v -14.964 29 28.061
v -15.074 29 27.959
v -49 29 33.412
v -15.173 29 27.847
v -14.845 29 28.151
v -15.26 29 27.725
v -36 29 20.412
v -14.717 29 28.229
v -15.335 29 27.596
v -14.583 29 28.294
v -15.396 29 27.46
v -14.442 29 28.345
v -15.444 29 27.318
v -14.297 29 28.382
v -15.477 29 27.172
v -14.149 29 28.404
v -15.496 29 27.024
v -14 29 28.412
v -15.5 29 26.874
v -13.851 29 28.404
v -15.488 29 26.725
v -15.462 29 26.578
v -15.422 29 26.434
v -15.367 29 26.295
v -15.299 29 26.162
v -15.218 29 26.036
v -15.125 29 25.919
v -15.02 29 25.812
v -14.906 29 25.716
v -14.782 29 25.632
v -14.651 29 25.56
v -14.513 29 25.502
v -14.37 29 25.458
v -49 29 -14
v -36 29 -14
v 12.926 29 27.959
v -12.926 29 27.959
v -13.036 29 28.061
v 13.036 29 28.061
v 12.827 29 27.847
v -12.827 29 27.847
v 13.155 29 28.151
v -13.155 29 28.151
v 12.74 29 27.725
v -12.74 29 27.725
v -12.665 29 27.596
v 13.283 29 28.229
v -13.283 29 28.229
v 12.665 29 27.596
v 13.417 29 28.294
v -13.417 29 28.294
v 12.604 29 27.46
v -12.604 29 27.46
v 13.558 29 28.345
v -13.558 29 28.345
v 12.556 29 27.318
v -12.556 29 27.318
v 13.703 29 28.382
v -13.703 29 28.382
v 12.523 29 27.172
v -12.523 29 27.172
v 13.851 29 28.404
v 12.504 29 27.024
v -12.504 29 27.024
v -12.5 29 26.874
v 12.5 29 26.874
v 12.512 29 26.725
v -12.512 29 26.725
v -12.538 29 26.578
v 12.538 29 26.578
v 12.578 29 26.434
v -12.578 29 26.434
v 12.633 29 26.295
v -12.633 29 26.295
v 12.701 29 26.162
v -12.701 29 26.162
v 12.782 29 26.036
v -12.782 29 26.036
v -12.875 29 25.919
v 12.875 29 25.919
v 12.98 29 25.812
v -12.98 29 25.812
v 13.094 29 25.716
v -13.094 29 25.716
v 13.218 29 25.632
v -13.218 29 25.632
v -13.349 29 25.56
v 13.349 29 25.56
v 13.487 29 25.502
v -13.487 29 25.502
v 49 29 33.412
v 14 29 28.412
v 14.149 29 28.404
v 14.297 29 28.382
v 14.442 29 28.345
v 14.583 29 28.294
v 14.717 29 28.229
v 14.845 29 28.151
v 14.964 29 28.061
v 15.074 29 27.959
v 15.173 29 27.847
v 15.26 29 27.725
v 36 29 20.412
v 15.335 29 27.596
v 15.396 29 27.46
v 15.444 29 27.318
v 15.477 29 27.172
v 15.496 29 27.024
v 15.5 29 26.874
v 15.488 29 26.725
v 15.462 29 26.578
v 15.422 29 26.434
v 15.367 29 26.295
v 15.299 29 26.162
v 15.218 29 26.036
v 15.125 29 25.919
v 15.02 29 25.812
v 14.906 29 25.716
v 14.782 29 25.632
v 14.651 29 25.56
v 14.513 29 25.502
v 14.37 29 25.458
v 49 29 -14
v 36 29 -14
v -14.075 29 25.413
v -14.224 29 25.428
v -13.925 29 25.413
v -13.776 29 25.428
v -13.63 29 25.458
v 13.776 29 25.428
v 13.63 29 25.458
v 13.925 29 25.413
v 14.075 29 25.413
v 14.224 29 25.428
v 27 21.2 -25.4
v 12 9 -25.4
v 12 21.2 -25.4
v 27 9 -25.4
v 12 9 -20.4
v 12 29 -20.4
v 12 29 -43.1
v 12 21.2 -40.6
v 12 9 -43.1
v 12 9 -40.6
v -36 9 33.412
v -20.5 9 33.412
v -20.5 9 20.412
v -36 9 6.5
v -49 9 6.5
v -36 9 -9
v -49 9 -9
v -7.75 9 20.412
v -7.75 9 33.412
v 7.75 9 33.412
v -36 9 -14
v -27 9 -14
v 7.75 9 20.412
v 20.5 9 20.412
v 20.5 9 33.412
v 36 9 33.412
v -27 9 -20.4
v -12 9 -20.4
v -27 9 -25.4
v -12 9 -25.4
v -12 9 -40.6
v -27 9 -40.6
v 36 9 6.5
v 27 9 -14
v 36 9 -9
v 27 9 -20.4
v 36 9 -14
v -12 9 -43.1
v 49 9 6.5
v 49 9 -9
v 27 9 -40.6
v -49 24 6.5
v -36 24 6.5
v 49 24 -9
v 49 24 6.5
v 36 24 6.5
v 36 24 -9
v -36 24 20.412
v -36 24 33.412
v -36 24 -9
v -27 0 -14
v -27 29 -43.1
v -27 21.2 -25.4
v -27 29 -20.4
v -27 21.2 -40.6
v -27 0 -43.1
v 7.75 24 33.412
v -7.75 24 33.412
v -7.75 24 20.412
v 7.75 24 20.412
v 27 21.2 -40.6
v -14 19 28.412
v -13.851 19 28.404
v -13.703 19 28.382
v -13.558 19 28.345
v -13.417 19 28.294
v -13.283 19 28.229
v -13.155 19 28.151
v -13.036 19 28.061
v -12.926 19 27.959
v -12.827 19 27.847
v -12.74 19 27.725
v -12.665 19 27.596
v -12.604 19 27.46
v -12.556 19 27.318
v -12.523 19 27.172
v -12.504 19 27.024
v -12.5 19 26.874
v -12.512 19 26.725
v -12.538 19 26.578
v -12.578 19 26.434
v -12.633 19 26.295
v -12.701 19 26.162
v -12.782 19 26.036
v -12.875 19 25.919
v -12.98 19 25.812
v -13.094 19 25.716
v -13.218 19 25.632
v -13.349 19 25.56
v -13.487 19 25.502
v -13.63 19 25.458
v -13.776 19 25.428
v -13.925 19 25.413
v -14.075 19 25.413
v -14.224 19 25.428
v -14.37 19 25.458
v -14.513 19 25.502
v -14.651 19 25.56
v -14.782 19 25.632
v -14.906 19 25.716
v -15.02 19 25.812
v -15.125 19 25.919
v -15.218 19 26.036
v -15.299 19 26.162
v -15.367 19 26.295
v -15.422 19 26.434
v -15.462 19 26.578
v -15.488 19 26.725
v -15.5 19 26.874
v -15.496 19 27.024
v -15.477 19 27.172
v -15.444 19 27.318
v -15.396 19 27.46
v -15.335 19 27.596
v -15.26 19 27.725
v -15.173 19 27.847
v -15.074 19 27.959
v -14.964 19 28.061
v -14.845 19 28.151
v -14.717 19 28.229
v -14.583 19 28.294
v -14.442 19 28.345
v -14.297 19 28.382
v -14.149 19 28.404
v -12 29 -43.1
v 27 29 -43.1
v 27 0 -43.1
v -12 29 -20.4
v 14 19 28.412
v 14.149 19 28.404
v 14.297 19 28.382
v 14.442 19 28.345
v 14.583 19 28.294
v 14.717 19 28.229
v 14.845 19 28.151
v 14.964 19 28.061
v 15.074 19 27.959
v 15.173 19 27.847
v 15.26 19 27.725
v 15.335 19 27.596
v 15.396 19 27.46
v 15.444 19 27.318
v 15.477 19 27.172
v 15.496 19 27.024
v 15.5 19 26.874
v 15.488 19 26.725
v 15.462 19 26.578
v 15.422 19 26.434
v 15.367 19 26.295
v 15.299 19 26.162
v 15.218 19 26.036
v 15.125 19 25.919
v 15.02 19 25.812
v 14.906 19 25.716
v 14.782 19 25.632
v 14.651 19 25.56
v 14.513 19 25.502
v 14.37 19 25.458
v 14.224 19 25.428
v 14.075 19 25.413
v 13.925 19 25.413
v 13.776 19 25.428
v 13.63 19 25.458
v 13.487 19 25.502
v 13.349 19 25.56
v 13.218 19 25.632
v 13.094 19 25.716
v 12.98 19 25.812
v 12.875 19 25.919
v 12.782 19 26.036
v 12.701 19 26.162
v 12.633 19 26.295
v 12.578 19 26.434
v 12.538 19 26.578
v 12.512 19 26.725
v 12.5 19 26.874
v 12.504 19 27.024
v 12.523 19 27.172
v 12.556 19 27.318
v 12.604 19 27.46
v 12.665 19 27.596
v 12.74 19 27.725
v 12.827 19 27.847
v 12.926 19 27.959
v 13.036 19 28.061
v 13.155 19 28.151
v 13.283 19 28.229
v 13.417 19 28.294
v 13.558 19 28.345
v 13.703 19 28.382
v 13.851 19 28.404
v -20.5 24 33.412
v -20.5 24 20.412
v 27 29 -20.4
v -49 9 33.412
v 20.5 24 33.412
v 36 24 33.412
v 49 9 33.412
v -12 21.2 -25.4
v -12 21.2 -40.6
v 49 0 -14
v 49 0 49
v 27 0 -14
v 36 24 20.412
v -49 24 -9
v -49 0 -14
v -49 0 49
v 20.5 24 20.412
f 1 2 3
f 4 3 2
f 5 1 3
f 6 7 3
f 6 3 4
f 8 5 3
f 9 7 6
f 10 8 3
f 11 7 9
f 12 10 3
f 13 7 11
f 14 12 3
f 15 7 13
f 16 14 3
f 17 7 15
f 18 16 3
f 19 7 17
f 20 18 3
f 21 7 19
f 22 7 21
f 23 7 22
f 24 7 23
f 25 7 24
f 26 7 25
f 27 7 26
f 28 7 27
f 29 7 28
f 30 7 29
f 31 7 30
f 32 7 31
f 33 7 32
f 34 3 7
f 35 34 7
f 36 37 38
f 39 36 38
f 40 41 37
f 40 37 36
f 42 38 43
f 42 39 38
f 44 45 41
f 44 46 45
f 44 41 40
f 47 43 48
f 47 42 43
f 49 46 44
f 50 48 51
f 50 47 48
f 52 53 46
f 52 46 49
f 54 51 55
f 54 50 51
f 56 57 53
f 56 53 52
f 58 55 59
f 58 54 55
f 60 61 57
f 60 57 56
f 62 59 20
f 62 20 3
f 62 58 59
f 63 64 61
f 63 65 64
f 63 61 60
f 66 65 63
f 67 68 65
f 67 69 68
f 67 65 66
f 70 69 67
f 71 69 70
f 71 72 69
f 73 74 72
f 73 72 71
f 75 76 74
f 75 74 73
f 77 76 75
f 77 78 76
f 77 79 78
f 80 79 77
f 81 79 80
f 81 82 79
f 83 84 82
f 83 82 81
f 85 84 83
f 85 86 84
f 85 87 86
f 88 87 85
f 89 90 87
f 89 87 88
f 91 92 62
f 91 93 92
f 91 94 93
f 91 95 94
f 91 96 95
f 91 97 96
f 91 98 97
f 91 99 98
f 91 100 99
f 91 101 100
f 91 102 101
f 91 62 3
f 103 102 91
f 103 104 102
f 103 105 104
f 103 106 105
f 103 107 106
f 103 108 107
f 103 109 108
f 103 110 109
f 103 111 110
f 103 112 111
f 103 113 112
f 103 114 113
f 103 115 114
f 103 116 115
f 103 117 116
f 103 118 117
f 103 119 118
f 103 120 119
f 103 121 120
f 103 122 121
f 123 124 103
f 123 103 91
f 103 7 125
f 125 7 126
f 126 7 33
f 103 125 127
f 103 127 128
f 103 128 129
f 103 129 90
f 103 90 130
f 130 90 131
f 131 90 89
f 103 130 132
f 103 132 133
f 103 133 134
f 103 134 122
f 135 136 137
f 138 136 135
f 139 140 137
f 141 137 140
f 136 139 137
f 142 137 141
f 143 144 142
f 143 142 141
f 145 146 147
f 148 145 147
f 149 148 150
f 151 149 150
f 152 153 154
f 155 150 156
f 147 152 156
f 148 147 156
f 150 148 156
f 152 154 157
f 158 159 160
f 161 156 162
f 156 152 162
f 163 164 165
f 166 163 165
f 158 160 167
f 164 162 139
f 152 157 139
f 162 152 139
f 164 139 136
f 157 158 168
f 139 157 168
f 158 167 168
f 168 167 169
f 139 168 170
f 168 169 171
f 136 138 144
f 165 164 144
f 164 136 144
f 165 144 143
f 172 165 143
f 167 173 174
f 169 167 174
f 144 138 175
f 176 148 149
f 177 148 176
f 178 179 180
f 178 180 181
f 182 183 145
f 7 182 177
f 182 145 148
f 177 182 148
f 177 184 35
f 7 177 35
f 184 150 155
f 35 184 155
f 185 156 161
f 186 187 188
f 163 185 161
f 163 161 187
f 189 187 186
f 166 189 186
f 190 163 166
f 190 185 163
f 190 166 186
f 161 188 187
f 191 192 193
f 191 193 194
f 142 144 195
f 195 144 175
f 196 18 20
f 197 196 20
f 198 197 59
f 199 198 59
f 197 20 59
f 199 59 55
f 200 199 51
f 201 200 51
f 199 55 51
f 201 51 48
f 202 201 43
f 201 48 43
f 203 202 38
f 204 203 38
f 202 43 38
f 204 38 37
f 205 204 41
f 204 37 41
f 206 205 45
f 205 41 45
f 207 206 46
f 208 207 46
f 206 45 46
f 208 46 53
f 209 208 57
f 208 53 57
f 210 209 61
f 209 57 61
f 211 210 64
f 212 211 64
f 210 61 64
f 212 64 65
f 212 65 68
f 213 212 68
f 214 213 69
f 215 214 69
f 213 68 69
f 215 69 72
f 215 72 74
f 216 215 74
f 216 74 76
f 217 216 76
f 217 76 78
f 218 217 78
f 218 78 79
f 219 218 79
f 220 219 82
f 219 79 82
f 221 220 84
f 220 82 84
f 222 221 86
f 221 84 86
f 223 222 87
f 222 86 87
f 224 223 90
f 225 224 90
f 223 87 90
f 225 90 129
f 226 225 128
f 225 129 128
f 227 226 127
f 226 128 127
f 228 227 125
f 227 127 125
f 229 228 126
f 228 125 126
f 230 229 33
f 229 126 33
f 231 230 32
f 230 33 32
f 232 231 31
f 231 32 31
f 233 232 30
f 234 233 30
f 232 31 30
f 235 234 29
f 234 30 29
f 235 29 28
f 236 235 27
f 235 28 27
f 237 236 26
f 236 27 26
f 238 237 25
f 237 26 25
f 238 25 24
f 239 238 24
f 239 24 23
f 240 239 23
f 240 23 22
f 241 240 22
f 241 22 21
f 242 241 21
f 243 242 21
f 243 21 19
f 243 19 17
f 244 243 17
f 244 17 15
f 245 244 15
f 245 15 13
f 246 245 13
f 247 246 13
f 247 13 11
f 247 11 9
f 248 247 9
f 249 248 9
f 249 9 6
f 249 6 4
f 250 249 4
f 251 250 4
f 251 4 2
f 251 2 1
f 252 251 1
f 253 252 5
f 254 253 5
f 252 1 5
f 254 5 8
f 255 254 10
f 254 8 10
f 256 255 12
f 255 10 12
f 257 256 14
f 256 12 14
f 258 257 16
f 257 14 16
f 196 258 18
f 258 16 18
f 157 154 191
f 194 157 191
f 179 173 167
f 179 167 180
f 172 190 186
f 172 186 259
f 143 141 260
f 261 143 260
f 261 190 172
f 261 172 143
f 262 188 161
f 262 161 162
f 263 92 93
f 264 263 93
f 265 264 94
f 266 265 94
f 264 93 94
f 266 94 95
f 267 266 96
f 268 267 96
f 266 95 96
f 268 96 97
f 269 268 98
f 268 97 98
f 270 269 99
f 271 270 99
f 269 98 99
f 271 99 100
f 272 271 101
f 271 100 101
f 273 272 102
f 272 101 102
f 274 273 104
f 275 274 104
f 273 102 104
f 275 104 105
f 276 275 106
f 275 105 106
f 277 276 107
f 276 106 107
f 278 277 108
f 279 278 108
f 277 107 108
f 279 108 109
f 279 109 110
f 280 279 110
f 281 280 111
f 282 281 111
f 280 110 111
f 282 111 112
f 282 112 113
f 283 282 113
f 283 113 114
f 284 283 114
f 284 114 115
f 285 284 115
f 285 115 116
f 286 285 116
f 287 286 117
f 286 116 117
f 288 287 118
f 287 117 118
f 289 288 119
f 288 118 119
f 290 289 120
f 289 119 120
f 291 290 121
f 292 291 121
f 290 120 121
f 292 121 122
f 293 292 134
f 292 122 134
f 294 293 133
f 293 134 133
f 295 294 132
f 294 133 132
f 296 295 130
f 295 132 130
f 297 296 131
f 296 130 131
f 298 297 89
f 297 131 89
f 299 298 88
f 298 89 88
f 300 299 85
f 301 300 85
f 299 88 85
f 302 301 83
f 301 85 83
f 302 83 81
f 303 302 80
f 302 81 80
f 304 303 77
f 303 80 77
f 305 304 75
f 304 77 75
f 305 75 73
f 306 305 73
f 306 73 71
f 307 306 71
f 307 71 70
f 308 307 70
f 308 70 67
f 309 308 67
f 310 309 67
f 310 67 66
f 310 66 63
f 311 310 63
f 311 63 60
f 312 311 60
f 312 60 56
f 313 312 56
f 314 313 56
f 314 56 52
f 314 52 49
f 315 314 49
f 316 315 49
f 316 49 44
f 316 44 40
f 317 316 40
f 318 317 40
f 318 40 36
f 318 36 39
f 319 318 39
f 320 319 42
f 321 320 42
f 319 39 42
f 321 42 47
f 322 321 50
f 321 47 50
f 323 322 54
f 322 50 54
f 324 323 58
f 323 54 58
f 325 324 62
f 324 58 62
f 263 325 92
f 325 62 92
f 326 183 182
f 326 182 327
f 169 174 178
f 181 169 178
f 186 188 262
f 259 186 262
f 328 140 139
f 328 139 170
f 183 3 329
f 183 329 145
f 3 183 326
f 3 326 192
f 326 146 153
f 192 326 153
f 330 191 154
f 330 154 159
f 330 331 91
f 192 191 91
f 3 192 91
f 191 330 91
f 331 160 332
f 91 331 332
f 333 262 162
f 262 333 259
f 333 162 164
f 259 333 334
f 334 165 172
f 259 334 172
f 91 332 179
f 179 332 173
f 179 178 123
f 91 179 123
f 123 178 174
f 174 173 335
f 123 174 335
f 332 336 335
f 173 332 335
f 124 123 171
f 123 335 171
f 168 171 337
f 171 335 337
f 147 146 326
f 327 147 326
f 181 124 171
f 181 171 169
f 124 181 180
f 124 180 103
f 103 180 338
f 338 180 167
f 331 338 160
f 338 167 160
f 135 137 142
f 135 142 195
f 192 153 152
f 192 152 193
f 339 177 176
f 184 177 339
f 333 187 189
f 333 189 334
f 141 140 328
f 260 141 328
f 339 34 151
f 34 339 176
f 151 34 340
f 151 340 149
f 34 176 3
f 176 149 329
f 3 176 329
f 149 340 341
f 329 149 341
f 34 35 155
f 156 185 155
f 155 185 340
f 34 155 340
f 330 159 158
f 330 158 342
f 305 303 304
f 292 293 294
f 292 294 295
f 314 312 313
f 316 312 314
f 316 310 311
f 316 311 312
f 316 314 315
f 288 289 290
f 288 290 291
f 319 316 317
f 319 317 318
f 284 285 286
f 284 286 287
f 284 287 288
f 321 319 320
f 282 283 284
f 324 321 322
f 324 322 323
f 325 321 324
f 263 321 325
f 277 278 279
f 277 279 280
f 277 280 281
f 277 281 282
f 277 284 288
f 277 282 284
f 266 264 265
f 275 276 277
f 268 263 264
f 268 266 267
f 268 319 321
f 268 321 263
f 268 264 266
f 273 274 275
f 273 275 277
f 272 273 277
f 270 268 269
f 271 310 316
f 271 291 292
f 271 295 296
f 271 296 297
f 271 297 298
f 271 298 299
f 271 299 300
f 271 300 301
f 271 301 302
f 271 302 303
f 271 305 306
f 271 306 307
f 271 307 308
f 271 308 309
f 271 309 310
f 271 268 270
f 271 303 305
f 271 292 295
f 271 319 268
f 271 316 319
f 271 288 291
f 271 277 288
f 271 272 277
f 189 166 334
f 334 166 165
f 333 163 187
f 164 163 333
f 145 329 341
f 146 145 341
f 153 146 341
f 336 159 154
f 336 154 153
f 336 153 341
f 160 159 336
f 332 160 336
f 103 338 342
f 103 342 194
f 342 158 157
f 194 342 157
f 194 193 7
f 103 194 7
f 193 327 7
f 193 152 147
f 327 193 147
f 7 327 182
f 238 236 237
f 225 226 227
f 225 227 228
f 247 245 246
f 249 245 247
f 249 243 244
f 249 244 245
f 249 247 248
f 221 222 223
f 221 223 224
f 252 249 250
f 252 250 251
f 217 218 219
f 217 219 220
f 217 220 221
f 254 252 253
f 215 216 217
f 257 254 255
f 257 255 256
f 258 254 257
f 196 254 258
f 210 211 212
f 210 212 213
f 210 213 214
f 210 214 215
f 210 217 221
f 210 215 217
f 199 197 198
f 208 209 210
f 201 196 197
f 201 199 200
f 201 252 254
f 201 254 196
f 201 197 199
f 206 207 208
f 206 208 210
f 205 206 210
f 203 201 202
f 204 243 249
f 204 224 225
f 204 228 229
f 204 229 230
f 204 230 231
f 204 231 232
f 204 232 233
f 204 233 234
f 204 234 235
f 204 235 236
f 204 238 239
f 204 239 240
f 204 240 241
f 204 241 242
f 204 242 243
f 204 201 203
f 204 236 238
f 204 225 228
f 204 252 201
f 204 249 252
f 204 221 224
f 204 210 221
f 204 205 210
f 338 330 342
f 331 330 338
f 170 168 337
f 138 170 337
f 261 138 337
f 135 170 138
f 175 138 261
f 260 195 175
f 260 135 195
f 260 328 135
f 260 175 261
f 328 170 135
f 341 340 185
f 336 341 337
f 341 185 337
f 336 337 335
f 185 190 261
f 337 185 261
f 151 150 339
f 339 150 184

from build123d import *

# Parameters (mm, degrees)
CROQUIS1_W              = 98
CROQUIS1_H              = 98
SALIENTE_EXTRUIR1_DEPTH = 9
CHAFL_N1_SIZE2          = 15.588457268
CHAFL_N1_SIZE           = 9
CROQUIS2_W              = 22
CROQUIS2_H              = 35
CORTAR_EXTRUIR1_DEPTH   = 9
CROQUIS3_W              = 15
CROQUIS3_H              = 2.5
SALIENTE_EXTRUIR2_DEPTH = 12.2
CROQUIS4_W              = 15
CROQUIS4_H              = 20.2
SALIENTE_EXTRUIR3_DEPTH = 2.5
CROQUIS5_W              = 5.9
CROQUIS5_H              = 9
CORTAR_EXTRUIR2_DEPTH   = 54.2
CROQUIS6_W              = 15
CROQUIS6_H              = 14.7
SALIENTE_EXTRUIR4_DEPTH = 2.5
SALIENTE_EXTRUIR5_DEPTH = 20
CROQUIS8_W              = 15.5
CROQUIS8_H              = 15
CORTAR_EXTRUIR3_DEPTH   = 98
CROQUIS9_W              = 15.5
CROQUIS9_H              = 15
CORTAR_EXTRUIR4_DEPTH   = 13
CROQUIS10_W             = 15
CROQUIS10_H             = 22.7
SALIENTE_EXTRUIR6_DEPTH = 5.3
CROQUIS11_R             = 1.5
CORTAR_EXTRUIR5_DEPTH   = 10


with BuildPart() as part:
    # Croquis1 → Saliente-Extruir1 (new body)
    with BuildSketch(Plane(origin=(0, 0, 0), x_dir=(1, 0, 0), z_dir=(0, 1, 0))):
        Rectangle(CROQUIS1_W, CROQUIS1_H)
    extrude(amount=SALIENTE_EXTRUIR1_DEPTH)

    # Chaflán1
    chafl_n1_edges = [part.edges().sort_by_distance(p)[0] for p in [
        (0, 9, 49),
    ]]
    chafl_n1_side = [part.faces().sort_by_distance(p)[0] for p in [
        (0, 8.82, 49),
    ]]
    chamfer(chafl_n1_edges, length=CHAFL_N1_SIZE - 0.0001, length2=CHAFL_N1_SIZE2 - 0.0001, reference=chafl_n1_side[0])  # a hair under: the kernel refuses the full size

    # Croquis2 → Cortar-Extruir1 (cut)
    with BuildSketch(Plane(origin=(0, 9, 0), x_dir=(1, 0, 0), z_dir=(0, 1, 0))):
        with Locations((-38, 31.5)):
            Rectangle(CROQUIS2_W, CROQUIS2_H)
        with Locations((38, 31.5)):
            Rectangle(CROQUIS2_W, CROQUIS2_H)
    extrude(amount=-CORTAR_EXTRUIR1_DEPTH, mode=Mode.SUBTRACT)

    # Croquis3 → Saliente-Extruir2 (add)
    with BuildSketch(Plane(origin=(0, 9, 0), x_dir=(1, 0, 0), z_dir=(0, 1, 0))):
        with Locations((19.5, 41.85)):
            Rectangle(CROQUIS3_W, CROQUIS3_H)
        with Locations((19.5, 24.15)):
            Rectangle(CROQUIS3_W, CROQUIS3_H)
        with Locations((-19.5, 41.85)):
            Rectangle(CROQUIS3_W, CROQUIS3_H)
        with Locations((-19.5, 24.15)):
            Rectangle(CROQUIS3_W, CROQUIS3_H)
    extrude(amount=SALIENTE_EXTRUIR2_DEPTH)

    # Croquis4 → Saliente-Extruir3 (add)
    with BuildSketch(Plane(origin=(0, 21.2, 0), x_dir=(1, 0, 0), z_dir=(0, 1, 0))):
        with Locations((-19.5, 33)):
            Rectangle(CROQUIS4_W, CROQUIS4_H)
        with Locations((19.5, 33)):
            Rectangle(CROQUIS4_W, CROQUIS4_H)
    extrude(amount=SALIENTE_EXTRUIR3_DEPTH)

    # Croquis5 → Cortar-Extruir2 (cut)
    with BuildSketch(Plane(origin=(27, 0, 0), x_dir=(0, 0, -1), z_dir=(1, 0, 0))):
        with Locations((46.05, 4.5)):
            Rectangle(CROQUIS5_W, CROQUIS5_H)
    extrude(amount=-CORTAR_EXTRUIR2_DEPTH, mode=Mode.SUBTRACT)

    # Croquis6 → Saliente-Extruir4 (add)
    with BuildSketch(Plane.XY.offset(-22.9)):
        with Locations((-19.5, 16.35)):
            Rectangle(CROQUIS6_W, CROQUIS6_H)
        with Locations((19.5, 16.35)):
            Rectangle(CROQUIS6_W, CROQUIS6_H)
    extrude(amount=SALIENTE_EXTRUIR4_DEPTH)

    # Croquis7 → Saliente-Extruir5 (add)
    with BuildSketch(Plane(origin=(0, 9, 0), x_dir=(1, 0, 0), z_dir=(0, 1, 0))):
        Polygon((-49, 14), (-49, -33.411542732), (49, -33.411542732), (49, 14), (36, 14), (36, -20.411542732), (-36, -20.411542732), (-36, 14), align=None)
    extrude(amount=SALIENTE_EXTRUIR5_DEPTH)

    # Croquis8 → Cortar-Extruir3 (cut)
    with BuildSketch(Plane(origin=(49, 0, 0), x_dir=(0, 0, -1), z_dir=(1, 0, 0))):
        with Locations((1.25, 16.5)):
            Rectangle(CROQUIS8_W, CROQUIS8_H)
    extrude(amount=-CORTAR_EXTRUIR3_DEPTH, mode=Mode.SUBTRACT)

    # Croquis9 → Cortar-Extruir4 (cut)
    with BuildSketch(Plane.XY.offset(33.411542732)):
        with Locations((-28.25, 16.5)):
            Rectangle(CROQUIS9_W, CROQUIS9_H)
        with Locations((0, 16.5)):
            Rectangle(CROQUIS9_W, CROQUIS9_H)
        with Locations((28.25, 16.5)):
            Rectangle(CROQUIS9_W, CROQUIS9_H)
    extrude(amount=-CORTAR_EXTRUIR4_DEPTH, mode=Mode.SUBTRACT)

    # Croquis10 → Saliente-Extruir6 (add)
    with BuildSketch(Plane(origin=(0, 23.7, 0), x_dir=(1, 0, 0), z_dir=(0, 1, 0))):
        with Locations((-19.5, 31.75)):
            Rectangle(CROQUIS10_W, CROQUIS10_H)
        with Locations((19.5, 31.75)):
            Rectangle(CROQUIS10_W, CROQUIS10_H)
    extrude(amount=SALIENTE_EXTRUIR6_DEPTH)

    # Croquis11 → Cortar-Extruir5 (cut)
    with BuildSketch(Plane(origin=(0, 29, 0), x_dir=(1, 0, 0), z_dir=(0, 1, 0))):
        with Locations(Location((-14, -26.911542732, 0), (0, 0, 270))):
            Circle(CROQUIS11_R)
        with Locations(Location((14, -26.911542732, 0), (0, 0, 270))):
            Circle(CROQUIS11_R)
    extrude(amount=-CORTAR_EXTRUIR5_DEPTH, mode=Mode.SUBTRACT)


solid = part.part
